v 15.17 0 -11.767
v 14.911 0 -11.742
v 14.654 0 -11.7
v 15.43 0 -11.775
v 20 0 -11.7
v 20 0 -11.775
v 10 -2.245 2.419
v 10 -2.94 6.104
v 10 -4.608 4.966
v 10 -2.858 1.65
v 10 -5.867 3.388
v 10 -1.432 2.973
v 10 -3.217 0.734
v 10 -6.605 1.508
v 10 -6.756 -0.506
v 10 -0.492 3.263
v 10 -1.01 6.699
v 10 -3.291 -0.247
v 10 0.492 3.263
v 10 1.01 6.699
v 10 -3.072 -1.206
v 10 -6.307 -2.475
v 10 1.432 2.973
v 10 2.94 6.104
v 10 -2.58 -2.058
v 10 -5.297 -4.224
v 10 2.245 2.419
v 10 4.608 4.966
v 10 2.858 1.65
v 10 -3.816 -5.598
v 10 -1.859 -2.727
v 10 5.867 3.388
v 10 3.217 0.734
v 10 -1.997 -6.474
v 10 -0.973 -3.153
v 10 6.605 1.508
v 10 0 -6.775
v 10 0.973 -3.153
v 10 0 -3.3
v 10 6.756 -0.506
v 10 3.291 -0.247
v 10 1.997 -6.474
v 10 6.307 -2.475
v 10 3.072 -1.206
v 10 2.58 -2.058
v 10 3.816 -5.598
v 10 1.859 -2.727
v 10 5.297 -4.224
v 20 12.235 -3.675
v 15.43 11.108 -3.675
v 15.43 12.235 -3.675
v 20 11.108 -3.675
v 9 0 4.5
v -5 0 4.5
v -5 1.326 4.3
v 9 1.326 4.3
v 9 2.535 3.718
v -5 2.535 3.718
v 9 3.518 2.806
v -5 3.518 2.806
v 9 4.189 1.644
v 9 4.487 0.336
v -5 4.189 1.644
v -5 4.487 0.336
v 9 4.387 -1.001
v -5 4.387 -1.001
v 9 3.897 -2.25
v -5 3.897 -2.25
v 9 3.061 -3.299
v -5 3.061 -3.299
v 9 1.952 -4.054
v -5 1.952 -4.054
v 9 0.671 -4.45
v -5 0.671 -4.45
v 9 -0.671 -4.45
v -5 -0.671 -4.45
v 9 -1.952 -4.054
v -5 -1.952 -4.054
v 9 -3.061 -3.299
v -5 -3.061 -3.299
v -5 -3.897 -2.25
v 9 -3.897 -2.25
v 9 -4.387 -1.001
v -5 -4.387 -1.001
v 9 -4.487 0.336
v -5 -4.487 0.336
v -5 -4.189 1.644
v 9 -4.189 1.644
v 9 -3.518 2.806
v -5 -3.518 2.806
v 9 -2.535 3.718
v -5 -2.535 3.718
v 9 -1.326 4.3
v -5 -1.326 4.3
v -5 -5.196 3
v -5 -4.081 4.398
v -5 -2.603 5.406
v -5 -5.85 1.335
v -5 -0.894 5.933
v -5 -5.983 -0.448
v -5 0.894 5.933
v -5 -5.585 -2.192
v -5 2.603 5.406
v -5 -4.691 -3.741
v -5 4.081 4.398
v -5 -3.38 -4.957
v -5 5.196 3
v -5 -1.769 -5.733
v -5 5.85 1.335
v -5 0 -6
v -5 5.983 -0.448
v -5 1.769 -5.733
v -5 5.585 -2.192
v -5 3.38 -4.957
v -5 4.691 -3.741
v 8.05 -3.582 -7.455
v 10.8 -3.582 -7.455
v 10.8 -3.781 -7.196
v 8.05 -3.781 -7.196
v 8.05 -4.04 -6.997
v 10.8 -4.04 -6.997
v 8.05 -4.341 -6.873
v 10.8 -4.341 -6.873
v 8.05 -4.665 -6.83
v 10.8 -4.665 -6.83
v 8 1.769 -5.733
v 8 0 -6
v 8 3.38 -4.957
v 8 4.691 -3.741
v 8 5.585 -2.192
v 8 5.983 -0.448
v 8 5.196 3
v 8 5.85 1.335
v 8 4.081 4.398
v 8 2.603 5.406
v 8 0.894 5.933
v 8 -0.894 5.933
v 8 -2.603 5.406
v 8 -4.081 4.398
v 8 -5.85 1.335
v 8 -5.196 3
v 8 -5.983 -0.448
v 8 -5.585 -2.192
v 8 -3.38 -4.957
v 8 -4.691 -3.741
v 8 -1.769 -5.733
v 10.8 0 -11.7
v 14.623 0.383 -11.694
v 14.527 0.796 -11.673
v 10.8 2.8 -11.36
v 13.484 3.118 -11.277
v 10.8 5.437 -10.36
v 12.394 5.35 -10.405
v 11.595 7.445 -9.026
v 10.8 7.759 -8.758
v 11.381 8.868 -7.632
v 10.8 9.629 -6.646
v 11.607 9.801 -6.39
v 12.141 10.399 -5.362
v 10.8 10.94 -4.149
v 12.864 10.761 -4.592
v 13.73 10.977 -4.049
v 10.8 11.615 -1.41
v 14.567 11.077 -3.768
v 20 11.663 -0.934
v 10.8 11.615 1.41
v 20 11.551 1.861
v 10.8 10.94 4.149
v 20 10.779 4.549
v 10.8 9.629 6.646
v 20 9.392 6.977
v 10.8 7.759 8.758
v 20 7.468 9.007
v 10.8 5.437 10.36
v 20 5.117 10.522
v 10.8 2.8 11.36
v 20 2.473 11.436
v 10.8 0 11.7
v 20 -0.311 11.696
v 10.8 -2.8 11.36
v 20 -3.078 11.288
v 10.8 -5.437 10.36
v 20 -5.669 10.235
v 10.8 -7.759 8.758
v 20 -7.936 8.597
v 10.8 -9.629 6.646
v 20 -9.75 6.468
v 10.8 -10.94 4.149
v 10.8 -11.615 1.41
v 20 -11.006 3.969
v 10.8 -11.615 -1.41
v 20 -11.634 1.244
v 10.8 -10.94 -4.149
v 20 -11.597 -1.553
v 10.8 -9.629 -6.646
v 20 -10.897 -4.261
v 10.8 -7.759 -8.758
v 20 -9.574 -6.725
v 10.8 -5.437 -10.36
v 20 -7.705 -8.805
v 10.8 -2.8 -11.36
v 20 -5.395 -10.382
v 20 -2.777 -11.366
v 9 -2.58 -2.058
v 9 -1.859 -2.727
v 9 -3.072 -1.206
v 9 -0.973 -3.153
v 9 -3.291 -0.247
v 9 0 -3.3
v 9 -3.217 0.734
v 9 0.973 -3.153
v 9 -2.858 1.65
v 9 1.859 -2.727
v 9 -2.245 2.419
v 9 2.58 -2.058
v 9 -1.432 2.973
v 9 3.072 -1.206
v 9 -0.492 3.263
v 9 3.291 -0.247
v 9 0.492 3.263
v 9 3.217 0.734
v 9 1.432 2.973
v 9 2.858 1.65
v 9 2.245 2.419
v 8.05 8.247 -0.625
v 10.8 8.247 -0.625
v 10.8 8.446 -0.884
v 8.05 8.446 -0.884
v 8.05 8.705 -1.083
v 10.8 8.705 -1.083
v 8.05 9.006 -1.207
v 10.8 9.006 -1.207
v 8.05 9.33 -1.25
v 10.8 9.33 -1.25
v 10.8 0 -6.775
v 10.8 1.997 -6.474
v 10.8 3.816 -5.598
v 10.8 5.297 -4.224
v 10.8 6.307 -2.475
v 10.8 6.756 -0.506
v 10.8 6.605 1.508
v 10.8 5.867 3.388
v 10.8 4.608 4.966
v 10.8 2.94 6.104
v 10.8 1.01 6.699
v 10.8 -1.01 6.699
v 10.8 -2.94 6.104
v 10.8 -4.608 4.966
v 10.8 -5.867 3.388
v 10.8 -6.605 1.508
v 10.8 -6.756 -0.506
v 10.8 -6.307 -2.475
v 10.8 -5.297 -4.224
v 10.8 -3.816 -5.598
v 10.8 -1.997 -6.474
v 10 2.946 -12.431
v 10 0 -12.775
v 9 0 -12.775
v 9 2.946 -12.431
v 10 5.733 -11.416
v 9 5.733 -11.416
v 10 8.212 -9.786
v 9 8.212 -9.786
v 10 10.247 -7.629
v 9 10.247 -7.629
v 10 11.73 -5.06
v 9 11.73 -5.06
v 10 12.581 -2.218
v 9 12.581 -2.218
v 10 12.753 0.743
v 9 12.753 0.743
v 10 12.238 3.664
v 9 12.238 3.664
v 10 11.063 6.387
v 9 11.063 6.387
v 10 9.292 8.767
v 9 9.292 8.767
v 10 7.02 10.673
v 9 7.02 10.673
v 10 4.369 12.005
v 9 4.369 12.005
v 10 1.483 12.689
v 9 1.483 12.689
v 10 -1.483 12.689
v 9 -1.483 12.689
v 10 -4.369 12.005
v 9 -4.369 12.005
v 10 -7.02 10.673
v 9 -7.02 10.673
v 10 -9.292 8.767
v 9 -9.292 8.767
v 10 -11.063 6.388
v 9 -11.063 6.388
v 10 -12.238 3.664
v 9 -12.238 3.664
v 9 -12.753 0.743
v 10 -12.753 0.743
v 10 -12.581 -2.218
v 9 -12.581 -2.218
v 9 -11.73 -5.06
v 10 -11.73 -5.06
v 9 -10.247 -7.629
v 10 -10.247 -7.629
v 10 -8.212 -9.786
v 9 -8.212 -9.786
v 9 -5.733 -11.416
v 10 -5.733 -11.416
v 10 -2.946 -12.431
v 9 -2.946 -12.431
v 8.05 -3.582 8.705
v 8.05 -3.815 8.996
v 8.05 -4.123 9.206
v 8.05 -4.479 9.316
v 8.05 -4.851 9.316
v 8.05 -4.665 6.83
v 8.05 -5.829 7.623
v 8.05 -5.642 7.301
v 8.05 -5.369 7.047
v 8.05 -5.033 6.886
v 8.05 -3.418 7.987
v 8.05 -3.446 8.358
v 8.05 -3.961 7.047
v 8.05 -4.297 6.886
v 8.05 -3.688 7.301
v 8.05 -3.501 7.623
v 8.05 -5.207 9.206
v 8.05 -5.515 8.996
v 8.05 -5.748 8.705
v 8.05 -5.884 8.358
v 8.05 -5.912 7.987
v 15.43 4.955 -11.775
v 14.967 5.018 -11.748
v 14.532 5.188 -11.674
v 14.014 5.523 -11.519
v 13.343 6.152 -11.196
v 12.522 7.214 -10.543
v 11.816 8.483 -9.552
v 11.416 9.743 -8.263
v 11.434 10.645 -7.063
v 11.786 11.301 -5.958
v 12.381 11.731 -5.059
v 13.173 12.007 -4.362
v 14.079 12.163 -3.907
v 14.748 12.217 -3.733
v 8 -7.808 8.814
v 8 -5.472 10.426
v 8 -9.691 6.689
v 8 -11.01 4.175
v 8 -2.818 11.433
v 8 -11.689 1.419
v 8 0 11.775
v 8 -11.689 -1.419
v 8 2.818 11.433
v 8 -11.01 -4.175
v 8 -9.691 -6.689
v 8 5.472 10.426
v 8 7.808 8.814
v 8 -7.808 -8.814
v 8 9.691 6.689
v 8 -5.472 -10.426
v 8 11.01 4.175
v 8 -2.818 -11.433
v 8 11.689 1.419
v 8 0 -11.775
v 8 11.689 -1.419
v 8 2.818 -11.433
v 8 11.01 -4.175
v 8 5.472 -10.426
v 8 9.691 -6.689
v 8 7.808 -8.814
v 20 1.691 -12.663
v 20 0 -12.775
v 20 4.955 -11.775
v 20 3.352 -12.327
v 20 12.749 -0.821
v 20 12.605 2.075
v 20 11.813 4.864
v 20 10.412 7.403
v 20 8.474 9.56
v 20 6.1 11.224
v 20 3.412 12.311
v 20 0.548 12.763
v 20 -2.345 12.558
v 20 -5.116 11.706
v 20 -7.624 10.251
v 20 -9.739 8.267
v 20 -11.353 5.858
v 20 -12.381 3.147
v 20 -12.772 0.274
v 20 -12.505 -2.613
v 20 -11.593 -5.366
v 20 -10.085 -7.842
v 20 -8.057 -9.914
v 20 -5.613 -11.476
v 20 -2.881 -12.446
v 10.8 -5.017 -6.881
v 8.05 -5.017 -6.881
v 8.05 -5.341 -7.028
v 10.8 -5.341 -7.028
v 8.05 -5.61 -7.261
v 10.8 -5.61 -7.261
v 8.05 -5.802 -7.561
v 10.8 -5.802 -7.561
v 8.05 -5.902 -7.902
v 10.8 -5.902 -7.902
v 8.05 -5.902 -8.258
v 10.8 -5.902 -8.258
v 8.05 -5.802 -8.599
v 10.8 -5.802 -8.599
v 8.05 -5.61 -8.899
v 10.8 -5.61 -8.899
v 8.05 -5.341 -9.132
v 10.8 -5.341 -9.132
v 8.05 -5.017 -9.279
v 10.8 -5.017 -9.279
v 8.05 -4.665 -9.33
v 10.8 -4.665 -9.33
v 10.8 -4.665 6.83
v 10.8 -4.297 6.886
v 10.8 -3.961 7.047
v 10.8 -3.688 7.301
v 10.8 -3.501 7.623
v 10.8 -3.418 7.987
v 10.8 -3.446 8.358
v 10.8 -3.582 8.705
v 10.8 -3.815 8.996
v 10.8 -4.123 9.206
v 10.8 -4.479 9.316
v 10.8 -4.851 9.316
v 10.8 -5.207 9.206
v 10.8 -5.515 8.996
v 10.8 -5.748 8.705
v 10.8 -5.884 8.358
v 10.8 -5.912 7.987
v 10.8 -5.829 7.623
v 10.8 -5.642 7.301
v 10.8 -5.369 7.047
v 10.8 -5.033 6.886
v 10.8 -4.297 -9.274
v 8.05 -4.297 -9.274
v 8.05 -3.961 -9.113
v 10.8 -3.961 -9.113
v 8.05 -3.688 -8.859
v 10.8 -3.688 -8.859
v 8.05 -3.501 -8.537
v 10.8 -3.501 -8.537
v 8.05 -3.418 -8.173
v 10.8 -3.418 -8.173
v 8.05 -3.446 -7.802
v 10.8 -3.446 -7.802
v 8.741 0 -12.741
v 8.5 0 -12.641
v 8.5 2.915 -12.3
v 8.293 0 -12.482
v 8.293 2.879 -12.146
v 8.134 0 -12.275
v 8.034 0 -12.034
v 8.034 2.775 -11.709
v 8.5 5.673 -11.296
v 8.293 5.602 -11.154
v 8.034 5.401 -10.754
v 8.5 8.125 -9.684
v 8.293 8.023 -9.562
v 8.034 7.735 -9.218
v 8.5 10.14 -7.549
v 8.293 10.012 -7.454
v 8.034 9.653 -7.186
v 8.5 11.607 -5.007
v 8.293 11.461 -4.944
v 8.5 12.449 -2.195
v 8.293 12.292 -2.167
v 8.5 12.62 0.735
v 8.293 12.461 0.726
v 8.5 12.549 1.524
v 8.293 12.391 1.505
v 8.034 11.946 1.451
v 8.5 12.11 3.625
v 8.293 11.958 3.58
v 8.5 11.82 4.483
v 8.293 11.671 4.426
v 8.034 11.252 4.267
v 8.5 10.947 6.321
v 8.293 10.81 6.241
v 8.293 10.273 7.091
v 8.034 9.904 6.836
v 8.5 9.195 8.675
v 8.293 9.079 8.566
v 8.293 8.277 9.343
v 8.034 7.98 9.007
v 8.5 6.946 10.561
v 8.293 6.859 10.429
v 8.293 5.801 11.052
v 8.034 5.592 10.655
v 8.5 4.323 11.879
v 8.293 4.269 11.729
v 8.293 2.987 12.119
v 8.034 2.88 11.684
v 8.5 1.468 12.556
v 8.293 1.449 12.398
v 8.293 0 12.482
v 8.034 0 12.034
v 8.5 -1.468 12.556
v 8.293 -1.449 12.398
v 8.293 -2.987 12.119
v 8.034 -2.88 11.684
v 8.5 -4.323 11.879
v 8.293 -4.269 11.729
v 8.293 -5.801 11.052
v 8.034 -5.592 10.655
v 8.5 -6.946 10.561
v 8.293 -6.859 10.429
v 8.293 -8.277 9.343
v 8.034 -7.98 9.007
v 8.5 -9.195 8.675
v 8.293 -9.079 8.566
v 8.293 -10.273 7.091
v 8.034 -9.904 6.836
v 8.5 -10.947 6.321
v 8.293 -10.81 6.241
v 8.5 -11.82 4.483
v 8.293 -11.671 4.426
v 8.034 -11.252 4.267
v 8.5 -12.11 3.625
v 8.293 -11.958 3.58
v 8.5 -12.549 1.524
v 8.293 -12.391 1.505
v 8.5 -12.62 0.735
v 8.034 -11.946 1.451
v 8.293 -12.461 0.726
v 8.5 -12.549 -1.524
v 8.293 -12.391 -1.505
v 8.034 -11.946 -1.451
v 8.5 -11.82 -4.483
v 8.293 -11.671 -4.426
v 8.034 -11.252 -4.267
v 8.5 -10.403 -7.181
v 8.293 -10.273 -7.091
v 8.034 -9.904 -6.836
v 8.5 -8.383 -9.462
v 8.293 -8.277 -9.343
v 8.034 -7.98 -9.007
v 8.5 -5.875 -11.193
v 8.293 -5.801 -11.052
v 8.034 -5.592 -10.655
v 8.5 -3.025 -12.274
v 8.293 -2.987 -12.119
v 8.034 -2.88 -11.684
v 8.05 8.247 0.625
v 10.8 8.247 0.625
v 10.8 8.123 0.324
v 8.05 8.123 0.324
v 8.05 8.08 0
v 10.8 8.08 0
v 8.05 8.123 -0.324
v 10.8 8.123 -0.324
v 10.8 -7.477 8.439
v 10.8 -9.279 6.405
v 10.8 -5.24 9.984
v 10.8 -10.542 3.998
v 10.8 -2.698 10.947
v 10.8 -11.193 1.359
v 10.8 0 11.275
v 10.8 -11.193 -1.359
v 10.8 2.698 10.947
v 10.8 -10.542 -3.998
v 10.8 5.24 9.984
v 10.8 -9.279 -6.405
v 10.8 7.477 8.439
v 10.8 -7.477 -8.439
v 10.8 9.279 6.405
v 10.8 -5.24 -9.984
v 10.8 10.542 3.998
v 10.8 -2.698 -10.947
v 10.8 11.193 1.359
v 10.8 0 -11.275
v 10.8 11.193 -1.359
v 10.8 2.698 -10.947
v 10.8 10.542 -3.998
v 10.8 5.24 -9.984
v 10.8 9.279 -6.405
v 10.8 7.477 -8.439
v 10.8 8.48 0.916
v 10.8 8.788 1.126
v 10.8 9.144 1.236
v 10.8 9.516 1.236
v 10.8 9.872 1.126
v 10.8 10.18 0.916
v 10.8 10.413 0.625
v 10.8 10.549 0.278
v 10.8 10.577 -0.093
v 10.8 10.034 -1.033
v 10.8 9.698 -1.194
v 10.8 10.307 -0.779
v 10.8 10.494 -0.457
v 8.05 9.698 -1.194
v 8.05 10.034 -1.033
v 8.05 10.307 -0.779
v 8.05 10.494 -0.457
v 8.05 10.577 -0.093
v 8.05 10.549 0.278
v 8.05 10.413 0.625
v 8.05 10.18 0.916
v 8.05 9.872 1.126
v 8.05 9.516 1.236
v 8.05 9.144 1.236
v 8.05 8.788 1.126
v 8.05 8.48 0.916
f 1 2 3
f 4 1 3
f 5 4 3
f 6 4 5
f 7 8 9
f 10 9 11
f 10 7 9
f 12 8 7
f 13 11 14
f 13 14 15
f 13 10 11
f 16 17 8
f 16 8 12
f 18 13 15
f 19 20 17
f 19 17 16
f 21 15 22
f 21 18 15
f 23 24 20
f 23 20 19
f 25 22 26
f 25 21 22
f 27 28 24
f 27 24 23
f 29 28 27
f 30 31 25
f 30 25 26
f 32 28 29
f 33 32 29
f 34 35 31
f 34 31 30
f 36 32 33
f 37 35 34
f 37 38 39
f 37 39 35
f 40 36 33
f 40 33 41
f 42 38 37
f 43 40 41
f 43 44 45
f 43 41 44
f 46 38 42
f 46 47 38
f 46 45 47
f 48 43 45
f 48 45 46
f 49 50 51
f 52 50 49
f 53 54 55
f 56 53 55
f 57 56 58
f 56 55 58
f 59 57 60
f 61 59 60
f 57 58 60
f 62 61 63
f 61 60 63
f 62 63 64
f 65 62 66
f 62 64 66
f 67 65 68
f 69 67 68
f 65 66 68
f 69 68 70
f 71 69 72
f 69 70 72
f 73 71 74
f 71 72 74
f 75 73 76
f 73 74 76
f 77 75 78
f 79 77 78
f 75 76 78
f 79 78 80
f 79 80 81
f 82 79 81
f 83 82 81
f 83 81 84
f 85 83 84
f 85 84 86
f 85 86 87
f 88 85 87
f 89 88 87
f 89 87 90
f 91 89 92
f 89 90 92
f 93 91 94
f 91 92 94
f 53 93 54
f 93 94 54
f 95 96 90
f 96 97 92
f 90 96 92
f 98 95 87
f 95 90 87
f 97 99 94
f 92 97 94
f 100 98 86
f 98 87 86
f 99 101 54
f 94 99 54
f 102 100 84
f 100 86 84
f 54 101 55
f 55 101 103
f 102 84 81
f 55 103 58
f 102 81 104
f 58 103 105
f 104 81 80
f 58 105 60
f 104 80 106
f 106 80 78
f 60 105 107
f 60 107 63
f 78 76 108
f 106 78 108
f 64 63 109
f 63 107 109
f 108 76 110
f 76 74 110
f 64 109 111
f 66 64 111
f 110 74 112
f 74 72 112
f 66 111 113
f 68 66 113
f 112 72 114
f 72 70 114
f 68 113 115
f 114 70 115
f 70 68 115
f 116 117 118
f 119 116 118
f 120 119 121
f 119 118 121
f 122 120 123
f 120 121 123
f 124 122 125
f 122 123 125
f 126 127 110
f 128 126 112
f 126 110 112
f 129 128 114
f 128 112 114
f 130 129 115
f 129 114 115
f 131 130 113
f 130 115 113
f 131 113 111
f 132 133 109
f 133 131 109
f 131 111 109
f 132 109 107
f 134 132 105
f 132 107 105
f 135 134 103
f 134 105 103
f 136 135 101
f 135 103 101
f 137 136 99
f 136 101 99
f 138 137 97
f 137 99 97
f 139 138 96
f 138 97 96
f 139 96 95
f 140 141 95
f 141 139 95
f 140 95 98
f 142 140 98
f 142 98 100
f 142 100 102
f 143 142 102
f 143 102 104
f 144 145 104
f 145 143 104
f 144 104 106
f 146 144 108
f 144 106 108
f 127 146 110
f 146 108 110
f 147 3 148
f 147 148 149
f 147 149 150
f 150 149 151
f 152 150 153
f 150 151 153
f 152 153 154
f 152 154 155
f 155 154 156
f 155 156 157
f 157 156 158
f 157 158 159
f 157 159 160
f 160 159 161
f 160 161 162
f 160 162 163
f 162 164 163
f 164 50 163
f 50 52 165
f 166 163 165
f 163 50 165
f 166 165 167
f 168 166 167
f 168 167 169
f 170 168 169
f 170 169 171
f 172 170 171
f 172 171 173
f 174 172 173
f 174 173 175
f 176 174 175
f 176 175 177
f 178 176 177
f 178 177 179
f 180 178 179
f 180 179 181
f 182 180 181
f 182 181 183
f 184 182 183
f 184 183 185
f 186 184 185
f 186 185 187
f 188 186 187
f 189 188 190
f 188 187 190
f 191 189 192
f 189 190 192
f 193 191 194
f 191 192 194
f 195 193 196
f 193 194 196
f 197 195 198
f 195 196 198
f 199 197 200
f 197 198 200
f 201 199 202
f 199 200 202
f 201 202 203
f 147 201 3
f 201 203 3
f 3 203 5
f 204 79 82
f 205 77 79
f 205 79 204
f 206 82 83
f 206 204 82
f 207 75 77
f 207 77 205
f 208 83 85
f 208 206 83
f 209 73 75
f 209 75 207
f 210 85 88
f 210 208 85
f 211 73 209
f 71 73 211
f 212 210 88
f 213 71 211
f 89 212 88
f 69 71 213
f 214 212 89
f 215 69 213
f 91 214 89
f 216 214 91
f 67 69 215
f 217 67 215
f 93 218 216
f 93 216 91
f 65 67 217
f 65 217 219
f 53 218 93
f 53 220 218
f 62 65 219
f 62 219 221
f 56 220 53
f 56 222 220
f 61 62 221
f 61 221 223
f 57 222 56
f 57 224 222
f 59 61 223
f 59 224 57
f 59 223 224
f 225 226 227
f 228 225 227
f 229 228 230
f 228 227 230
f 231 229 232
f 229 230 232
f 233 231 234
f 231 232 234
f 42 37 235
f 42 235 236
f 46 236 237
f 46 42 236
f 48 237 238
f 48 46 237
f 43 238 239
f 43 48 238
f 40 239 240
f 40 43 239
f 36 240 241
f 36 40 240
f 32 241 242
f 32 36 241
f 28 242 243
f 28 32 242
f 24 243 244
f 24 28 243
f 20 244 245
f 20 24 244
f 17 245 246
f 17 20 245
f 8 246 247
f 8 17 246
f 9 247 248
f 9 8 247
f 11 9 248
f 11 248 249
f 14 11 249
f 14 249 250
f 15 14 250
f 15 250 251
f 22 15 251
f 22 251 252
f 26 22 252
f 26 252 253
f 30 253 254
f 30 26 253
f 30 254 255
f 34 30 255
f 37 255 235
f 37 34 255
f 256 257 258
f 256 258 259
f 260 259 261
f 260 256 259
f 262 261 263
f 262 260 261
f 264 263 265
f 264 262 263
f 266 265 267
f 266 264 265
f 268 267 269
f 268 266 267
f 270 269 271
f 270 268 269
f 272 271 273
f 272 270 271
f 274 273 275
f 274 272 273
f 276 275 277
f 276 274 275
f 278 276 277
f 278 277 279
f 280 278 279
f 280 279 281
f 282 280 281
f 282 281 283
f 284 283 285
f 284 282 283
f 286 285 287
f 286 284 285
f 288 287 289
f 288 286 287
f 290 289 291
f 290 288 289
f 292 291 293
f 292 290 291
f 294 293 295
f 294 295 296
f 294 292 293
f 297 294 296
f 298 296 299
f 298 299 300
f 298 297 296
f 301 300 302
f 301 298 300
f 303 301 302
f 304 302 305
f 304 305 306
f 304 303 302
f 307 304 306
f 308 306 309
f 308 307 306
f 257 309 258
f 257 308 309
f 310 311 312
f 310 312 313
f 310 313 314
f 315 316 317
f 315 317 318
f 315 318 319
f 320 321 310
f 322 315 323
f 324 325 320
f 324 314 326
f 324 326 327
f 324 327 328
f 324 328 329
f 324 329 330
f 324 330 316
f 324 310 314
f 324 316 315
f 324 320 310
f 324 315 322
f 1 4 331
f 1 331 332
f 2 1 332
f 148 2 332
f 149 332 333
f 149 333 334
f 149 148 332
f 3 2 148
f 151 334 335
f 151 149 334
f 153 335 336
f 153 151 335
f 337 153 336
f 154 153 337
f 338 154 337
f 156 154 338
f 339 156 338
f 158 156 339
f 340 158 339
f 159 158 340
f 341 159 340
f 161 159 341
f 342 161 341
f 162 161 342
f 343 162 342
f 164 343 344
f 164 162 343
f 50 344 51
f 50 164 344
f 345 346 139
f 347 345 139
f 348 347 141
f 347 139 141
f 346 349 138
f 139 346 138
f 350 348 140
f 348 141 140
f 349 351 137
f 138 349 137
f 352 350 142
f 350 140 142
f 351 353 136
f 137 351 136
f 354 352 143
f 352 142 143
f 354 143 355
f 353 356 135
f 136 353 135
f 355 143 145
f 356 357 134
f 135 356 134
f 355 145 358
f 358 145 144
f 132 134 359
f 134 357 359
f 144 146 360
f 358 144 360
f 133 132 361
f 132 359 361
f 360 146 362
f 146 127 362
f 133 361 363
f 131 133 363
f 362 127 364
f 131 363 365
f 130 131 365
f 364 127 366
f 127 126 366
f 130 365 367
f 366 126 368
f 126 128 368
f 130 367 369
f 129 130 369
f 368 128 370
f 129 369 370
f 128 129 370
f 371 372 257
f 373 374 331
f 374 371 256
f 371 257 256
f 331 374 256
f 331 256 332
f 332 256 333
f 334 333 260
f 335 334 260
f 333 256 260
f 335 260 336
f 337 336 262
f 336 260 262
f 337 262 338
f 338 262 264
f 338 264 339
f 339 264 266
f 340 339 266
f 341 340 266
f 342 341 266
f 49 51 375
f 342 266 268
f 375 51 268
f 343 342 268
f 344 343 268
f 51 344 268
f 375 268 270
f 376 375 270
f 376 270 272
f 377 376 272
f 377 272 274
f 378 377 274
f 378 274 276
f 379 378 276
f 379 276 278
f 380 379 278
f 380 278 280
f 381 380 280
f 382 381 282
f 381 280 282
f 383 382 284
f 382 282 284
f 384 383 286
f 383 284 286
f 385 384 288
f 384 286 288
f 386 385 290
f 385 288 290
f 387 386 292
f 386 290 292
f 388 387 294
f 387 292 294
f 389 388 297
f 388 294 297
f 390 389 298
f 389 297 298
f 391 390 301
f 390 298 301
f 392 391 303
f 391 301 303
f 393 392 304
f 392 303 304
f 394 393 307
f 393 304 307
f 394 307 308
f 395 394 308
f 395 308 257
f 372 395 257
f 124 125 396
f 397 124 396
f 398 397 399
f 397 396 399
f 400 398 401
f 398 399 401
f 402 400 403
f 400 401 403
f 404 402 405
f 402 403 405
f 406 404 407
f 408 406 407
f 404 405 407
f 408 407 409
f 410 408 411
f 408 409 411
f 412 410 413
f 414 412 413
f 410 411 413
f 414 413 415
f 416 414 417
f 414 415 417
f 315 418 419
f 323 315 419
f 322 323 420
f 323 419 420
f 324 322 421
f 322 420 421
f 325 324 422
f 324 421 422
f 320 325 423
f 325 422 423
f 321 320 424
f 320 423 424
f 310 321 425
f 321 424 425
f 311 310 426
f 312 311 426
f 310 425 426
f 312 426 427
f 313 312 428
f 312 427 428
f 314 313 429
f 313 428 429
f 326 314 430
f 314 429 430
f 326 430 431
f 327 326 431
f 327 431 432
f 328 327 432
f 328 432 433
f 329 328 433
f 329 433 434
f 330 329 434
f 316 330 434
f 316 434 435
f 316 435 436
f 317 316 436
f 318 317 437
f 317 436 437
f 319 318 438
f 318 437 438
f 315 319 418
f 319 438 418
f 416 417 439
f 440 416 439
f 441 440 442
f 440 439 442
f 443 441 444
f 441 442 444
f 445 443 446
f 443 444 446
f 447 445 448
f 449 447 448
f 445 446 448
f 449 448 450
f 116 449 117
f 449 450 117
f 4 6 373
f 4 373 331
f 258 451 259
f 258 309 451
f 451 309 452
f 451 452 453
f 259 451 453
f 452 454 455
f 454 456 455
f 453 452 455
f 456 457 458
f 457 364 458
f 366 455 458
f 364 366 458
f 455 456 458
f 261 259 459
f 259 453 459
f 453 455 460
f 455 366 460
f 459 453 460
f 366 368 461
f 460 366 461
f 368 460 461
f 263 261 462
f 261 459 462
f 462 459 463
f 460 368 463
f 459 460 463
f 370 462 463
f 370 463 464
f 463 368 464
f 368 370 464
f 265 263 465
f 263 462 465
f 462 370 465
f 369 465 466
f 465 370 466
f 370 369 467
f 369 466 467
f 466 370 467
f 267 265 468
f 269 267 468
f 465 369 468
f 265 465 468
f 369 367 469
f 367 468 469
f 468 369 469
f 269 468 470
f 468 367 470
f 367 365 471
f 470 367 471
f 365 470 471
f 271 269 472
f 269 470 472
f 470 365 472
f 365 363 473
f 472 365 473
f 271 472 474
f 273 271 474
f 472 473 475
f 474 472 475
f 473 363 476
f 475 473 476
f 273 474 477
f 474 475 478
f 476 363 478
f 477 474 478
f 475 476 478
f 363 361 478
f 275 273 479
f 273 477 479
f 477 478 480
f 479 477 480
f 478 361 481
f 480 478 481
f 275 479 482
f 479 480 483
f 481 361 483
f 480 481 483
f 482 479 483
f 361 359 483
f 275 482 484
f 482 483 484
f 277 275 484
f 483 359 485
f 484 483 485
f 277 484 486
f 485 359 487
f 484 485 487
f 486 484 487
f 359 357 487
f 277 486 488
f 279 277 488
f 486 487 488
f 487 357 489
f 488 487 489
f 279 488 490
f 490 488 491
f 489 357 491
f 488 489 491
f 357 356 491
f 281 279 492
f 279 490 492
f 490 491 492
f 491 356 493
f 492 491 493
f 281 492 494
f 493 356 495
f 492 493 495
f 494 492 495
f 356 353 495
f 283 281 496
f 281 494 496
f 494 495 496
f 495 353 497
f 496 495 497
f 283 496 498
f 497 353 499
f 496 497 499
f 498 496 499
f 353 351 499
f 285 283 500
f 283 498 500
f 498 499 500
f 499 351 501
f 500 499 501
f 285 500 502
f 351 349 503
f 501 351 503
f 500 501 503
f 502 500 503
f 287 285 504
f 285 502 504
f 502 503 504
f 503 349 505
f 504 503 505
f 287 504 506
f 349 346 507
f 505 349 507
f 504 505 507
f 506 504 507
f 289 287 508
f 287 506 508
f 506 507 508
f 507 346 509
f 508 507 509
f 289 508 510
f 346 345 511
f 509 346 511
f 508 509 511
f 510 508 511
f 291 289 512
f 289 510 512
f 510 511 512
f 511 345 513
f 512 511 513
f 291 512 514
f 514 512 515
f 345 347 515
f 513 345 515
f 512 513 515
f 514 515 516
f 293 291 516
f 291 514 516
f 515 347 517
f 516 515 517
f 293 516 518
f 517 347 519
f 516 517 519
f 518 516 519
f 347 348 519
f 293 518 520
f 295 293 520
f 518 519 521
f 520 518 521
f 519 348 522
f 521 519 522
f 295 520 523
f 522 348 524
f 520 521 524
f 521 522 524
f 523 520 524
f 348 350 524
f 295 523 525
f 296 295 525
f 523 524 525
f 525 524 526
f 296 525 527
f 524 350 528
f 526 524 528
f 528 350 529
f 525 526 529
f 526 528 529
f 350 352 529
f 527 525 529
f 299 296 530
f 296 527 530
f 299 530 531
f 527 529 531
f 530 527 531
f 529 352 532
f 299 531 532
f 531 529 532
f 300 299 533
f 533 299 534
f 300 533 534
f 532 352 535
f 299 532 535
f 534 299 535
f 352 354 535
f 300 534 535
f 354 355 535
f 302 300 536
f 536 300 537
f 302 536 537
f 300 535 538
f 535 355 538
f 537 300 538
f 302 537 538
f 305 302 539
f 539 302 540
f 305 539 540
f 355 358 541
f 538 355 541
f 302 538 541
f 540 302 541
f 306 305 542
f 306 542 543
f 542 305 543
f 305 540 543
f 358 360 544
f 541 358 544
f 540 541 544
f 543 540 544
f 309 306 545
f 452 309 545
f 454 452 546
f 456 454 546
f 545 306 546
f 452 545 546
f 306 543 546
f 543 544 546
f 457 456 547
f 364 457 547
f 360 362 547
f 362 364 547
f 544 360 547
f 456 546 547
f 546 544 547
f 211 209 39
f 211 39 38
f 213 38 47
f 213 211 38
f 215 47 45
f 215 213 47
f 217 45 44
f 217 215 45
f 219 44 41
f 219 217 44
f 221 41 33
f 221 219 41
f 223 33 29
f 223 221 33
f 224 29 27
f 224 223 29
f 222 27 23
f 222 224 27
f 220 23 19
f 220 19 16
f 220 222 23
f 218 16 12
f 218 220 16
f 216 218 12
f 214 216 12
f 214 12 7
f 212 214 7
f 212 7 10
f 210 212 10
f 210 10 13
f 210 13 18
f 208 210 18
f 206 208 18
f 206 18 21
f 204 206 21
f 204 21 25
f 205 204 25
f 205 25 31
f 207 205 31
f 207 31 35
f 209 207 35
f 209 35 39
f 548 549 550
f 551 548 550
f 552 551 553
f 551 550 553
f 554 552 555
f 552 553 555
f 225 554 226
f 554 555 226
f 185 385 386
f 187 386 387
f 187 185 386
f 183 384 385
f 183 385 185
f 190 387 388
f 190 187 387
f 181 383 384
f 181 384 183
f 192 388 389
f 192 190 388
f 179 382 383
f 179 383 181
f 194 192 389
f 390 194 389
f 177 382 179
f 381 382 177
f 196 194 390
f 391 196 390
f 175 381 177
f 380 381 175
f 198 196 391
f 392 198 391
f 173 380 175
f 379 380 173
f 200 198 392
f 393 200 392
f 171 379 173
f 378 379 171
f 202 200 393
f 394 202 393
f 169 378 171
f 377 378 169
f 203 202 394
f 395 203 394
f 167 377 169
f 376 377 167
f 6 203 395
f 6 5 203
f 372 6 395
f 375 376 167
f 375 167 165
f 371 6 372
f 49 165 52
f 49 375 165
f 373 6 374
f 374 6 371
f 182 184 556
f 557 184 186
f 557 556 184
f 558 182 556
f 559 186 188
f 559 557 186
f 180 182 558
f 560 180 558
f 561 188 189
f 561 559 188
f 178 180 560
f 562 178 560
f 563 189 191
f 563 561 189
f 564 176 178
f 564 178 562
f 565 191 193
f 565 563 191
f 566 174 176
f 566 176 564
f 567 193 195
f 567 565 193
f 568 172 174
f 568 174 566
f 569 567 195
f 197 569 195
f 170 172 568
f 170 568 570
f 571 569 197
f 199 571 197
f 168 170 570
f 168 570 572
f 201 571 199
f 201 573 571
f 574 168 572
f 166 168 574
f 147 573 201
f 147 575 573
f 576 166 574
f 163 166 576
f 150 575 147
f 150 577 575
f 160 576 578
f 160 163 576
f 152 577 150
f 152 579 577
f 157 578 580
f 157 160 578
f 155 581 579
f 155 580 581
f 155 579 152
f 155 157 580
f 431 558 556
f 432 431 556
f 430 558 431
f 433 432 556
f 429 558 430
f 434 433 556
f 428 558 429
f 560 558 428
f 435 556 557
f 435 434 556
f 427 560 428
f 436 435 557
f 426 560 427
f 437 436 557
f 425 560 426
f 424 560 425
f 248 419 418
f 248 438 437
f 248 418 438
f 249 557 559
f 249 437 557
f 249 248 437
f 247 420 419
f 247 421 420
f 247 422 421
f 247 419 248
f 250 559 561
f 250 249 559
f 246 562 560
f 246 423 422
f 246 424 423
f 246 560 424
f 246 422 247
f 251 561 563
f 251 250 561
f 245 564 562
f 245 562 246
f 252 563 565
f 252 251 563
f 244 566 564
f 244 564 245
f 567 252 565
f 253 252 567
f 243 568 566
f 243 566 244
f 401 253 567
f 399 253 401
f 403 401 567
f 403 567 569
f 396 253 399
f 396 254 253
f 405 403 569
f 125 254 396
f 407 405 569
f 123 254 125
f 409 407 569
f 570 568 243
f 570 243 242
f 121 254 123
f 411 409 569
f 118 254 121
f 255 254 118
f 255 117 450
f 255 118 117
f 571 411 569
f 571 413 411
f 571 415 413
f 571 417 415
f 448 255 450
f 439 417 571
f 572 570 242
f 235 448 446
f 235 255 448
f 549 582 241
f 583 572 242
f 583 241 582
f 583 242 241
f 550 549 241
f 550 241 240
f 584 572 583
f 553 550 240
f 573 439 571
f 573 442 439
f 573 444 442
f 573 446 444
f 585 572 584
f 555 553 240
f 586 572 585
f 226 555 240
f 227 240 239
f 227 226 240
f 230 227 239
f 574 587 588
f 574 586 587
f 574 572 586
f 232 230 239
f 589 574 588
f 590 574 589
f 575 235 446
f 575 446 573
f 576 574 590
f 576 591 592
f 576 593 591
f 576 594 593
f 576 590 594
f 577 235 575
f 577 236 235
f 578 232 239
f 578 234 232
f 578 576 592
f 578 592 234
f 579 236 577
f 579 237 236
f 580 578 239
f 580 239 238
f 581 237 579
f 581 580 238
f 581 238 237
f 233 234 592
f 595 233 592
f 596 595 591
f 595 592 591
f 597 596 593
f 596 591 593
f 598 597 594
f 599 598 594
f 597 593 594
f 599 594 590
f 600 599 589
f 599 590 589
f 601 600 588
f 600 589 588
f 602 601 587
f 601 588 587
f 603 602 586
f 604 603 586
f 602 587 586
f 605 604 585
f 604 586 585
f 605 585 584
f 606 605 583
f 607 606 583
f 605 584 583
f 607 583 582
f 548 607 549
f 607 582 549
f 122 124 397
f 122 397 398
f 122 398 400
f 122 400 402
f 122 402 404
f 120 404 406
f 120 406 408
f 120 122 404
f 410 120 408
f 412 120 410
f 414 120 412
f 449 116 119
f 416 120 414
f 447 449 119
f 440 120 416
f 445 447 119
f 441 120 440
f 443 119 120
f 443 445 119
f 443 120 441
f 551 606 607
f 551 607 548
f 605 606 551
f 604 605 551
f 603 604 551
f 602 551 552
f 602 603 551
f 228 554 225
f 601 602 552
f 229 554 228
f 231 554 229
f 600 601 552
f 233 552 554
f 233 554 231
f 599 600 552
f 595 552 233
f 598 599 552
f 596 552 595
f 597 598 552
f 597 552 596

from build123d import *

# Parameters (mm, degrees)
BOSS_EXTRUDE3_DEPTH      = 10
BOSS_EXTRUDE3_DEPTH_BACK = 5
SKETCH3_R                = 6
SKETCH3_R_2              = 3.3
SKETCH10_R               = 12.775
SKETCH10_R_2             = 3.65
SKETCH10_R_3             = 2.1
BOSS_EXTRUDE5_DEPTH      = 2
SKETCH11_R               = 11.275
SKETCH11_R_2             = 6.775
BOSS_EXTRUDE6_DEPTH      = 0.8
SKETCH12_R               = 1.25
CUT_EXTRUDE2_DEPTH       = 2.75
FILLET3_R                = 1
SKETCH13_R               = 12.775
SKETCH13_R_2             = 11.275
BOSS_EXTRUDE7_DEPTH      = 10
SKETCH14_R               = 11.7
CUT_EXTRUDE3_DEPTH       = 9.2
CUT_EXTRUDE5_DEPTH       = 16
SKETCH16_R               = 4.5
CUT_EXTRUDE6_DEPTH       = 14


with BuildPart() as part:
    # Sketch3 → Boss-Extrude3 (new, two sides: drawn at the far end of the back side and taken through both)
    with BuildSketch(Plane(origin=(0, 0, 0), x_dir=(0, 0, -1), z_dir=(1, 0, 0)).offset(-BOSS_EXTRUDE3_DEPTH_BACK)):
        Circle(SKETCH3_R)
        Circle(SKETCH3_R_2, mode=Mode.SUBTRACT)
    extrude(amount=BOSS_EXTRUDE3_DEPTH + BOSS_EXTRUDE3_DEPTH_BACK)

    # Sketch10 → Boss-Extrude5 (add)
    # profile 1 of 2: a face of its own
    with BuildSketch(Plane(origin=(10, 0, 0), x_dir=(0, 0, -1), z_dir=(1, 0, 0))):
        Circle(SKETCH10_R)
        Circle(SKETCH10_R_2, mode=Mode.SUBTRACT)
    # profile 2 of 2: a face of its own
    with BuildSketch(Plane(origin=(10, 0, 0), x_dir=(0, 0, -1), z_dir=(1, 0, 0))):
        Circle(SKETCH10_R_3)
    extrude(amount=-BOSS_EXTRUDE5_DEPTH)


with BuildPart() as boss_extrude5_kept_piece:
    # of the separate pieces the step leaves, the one the design keeps (boss_extrude5_pieces_kept)
    add(part.part.solids().sort_by_distance((0, 0, -6))[0])

    # Sketch11 → Boss-Extrude6 (add)
    with BuildSketch(Plane(origin=(10, 0, 0), x_dir=(0, 0, -1), z_dir=(1, 0, 0))):
        Circle(SKETCH11_R)
        Circle(SKETCH11_R_2, mode=Mode.SUBTRACT)
    extrude(amount=BOSS_EXTRUDE6_DEPTH)

    # Sketch12 → Cut-Extrude2 (cut)
    with BuildSketch(Plane(origin=(10.8, 0, 0), x_dir=(0, 0, -1), z_dir=(1, 0, 0))):
        with BuildLine():
            ThreePointArc((9.330017017, -4.665), (8.705017017, -3.582468245), (7.455017017, -3.582468245))
            Line((7.455017017, -3.582468245), (8.080017017, -4.665))
            Line((8.080017017, -4.665), (6.830017017, -4.665))
            ThreePointArc((6.830017017, -4.665), (8.080017017, -5.915), (9.330017017, -4.665))
        make_face()
        with BuildLine():
            Line((8.080017017, -4.665), (7.455017017, -3.582468245))
            ThreePointArc((7.455017017, -3.582468245), (6.997485263, -4.04), (6.830017017, -4.665))
            Line((6.830017017, -4.665), (8.080017017, -4.665))
        make_face()
        with BuildLine():
            Line((0.625, 8.247468245), (0, 9.33))
            Line((0, 9.33), (-0.625, 8.247468245))
            ThreePointArc((-0.625, 8.247468245), (0, 8.08), (0.625, 8.247468245))
        make_face()
        with BuildLine():
            Line((-0.625, 8.247468245), (0, 9.33))
            Line((0, 9.33), (0.625, 8.247468245))
            ThreePointArc((0.625, 8.247468245), (1.082531755, 8.705), (1.25, 9.33))
            ThreePointArc((1.25, 9.33), (-0.625, 10.412531755), (-0.625, 8.247468245))
        make_face()
        with Locations((-8.080017017, -4.665)):
            Circle(SKETCH12_R)
    extrude(amount=-CUT_EXTRUDE2_DEPTH, mode=Mode.SUBTRACT)

    # Fillet3
    fillet3_edges = [boss_extrude5_kept_piece.edges().sort_by_distance(p)[0] for p in [
        (8, 0, 12.775),
    ]]
    fillet(fillet3_edges, radius=FILLET3_R)

    # Sketch13 → Boss-Extrude7 (add)
    with BuildSketch(Plane(origin=(10, 0, 0), x_dir=(0, 0, -1), z_dir=(1, 0, 0))):
        Circle(SKETCH13_R)
        Circle(SKETCH13_R_2, mode=Mode.SUBTRACT)
    extrude(amount=BOSS_EXTRUDE7_DEPTH)

    # Sketch14 → Cut-Extrude3 (cut)
    with BuildSketch(Plane(origin=(20, 0, 0), x_dir=(0, 0, -1), z_dir=(1, 0, 0))):
        Circle(SKETCH14_R)
    extrude(amount=-CUT_EXTRUDE3_DEPTH, mode=Mode.SUBTRACT)

    # Sketch15 → Cut-Extrude5 (cut)
    with BuildSketch(Plane(origin=(0, 0, 0), x_dir=(1, 0, 0), z_dir=(0, 1, 0))):
        with BuildLine():
            Line((15.430071931, 3.675), (20, 3.675))
            Line((20, 3.675), (20, 11.775))
            Line((20, 11.775), (15.430071931, 11.775))
            ThreePointArc((15.430071931, 11.775), (11.380071931, 7.725), (15.430071931, 3.675))
        make_face()
    extrude(amount=CUT_EXTRUDE5_DEPTH, mode=Mode.SUBTRACT)

    # Sketch16 → Cut-Extrude6 (cut)
    with BuildSketch(Plane.ZY.offset(5)):
        Circle(SKETCH16_R)
    extrude(amount=-CUT_EXTRUDE6_DEPTH, mode=Mode.SUBTRACT)


solid = boss_extrude5_kept_piece.part
